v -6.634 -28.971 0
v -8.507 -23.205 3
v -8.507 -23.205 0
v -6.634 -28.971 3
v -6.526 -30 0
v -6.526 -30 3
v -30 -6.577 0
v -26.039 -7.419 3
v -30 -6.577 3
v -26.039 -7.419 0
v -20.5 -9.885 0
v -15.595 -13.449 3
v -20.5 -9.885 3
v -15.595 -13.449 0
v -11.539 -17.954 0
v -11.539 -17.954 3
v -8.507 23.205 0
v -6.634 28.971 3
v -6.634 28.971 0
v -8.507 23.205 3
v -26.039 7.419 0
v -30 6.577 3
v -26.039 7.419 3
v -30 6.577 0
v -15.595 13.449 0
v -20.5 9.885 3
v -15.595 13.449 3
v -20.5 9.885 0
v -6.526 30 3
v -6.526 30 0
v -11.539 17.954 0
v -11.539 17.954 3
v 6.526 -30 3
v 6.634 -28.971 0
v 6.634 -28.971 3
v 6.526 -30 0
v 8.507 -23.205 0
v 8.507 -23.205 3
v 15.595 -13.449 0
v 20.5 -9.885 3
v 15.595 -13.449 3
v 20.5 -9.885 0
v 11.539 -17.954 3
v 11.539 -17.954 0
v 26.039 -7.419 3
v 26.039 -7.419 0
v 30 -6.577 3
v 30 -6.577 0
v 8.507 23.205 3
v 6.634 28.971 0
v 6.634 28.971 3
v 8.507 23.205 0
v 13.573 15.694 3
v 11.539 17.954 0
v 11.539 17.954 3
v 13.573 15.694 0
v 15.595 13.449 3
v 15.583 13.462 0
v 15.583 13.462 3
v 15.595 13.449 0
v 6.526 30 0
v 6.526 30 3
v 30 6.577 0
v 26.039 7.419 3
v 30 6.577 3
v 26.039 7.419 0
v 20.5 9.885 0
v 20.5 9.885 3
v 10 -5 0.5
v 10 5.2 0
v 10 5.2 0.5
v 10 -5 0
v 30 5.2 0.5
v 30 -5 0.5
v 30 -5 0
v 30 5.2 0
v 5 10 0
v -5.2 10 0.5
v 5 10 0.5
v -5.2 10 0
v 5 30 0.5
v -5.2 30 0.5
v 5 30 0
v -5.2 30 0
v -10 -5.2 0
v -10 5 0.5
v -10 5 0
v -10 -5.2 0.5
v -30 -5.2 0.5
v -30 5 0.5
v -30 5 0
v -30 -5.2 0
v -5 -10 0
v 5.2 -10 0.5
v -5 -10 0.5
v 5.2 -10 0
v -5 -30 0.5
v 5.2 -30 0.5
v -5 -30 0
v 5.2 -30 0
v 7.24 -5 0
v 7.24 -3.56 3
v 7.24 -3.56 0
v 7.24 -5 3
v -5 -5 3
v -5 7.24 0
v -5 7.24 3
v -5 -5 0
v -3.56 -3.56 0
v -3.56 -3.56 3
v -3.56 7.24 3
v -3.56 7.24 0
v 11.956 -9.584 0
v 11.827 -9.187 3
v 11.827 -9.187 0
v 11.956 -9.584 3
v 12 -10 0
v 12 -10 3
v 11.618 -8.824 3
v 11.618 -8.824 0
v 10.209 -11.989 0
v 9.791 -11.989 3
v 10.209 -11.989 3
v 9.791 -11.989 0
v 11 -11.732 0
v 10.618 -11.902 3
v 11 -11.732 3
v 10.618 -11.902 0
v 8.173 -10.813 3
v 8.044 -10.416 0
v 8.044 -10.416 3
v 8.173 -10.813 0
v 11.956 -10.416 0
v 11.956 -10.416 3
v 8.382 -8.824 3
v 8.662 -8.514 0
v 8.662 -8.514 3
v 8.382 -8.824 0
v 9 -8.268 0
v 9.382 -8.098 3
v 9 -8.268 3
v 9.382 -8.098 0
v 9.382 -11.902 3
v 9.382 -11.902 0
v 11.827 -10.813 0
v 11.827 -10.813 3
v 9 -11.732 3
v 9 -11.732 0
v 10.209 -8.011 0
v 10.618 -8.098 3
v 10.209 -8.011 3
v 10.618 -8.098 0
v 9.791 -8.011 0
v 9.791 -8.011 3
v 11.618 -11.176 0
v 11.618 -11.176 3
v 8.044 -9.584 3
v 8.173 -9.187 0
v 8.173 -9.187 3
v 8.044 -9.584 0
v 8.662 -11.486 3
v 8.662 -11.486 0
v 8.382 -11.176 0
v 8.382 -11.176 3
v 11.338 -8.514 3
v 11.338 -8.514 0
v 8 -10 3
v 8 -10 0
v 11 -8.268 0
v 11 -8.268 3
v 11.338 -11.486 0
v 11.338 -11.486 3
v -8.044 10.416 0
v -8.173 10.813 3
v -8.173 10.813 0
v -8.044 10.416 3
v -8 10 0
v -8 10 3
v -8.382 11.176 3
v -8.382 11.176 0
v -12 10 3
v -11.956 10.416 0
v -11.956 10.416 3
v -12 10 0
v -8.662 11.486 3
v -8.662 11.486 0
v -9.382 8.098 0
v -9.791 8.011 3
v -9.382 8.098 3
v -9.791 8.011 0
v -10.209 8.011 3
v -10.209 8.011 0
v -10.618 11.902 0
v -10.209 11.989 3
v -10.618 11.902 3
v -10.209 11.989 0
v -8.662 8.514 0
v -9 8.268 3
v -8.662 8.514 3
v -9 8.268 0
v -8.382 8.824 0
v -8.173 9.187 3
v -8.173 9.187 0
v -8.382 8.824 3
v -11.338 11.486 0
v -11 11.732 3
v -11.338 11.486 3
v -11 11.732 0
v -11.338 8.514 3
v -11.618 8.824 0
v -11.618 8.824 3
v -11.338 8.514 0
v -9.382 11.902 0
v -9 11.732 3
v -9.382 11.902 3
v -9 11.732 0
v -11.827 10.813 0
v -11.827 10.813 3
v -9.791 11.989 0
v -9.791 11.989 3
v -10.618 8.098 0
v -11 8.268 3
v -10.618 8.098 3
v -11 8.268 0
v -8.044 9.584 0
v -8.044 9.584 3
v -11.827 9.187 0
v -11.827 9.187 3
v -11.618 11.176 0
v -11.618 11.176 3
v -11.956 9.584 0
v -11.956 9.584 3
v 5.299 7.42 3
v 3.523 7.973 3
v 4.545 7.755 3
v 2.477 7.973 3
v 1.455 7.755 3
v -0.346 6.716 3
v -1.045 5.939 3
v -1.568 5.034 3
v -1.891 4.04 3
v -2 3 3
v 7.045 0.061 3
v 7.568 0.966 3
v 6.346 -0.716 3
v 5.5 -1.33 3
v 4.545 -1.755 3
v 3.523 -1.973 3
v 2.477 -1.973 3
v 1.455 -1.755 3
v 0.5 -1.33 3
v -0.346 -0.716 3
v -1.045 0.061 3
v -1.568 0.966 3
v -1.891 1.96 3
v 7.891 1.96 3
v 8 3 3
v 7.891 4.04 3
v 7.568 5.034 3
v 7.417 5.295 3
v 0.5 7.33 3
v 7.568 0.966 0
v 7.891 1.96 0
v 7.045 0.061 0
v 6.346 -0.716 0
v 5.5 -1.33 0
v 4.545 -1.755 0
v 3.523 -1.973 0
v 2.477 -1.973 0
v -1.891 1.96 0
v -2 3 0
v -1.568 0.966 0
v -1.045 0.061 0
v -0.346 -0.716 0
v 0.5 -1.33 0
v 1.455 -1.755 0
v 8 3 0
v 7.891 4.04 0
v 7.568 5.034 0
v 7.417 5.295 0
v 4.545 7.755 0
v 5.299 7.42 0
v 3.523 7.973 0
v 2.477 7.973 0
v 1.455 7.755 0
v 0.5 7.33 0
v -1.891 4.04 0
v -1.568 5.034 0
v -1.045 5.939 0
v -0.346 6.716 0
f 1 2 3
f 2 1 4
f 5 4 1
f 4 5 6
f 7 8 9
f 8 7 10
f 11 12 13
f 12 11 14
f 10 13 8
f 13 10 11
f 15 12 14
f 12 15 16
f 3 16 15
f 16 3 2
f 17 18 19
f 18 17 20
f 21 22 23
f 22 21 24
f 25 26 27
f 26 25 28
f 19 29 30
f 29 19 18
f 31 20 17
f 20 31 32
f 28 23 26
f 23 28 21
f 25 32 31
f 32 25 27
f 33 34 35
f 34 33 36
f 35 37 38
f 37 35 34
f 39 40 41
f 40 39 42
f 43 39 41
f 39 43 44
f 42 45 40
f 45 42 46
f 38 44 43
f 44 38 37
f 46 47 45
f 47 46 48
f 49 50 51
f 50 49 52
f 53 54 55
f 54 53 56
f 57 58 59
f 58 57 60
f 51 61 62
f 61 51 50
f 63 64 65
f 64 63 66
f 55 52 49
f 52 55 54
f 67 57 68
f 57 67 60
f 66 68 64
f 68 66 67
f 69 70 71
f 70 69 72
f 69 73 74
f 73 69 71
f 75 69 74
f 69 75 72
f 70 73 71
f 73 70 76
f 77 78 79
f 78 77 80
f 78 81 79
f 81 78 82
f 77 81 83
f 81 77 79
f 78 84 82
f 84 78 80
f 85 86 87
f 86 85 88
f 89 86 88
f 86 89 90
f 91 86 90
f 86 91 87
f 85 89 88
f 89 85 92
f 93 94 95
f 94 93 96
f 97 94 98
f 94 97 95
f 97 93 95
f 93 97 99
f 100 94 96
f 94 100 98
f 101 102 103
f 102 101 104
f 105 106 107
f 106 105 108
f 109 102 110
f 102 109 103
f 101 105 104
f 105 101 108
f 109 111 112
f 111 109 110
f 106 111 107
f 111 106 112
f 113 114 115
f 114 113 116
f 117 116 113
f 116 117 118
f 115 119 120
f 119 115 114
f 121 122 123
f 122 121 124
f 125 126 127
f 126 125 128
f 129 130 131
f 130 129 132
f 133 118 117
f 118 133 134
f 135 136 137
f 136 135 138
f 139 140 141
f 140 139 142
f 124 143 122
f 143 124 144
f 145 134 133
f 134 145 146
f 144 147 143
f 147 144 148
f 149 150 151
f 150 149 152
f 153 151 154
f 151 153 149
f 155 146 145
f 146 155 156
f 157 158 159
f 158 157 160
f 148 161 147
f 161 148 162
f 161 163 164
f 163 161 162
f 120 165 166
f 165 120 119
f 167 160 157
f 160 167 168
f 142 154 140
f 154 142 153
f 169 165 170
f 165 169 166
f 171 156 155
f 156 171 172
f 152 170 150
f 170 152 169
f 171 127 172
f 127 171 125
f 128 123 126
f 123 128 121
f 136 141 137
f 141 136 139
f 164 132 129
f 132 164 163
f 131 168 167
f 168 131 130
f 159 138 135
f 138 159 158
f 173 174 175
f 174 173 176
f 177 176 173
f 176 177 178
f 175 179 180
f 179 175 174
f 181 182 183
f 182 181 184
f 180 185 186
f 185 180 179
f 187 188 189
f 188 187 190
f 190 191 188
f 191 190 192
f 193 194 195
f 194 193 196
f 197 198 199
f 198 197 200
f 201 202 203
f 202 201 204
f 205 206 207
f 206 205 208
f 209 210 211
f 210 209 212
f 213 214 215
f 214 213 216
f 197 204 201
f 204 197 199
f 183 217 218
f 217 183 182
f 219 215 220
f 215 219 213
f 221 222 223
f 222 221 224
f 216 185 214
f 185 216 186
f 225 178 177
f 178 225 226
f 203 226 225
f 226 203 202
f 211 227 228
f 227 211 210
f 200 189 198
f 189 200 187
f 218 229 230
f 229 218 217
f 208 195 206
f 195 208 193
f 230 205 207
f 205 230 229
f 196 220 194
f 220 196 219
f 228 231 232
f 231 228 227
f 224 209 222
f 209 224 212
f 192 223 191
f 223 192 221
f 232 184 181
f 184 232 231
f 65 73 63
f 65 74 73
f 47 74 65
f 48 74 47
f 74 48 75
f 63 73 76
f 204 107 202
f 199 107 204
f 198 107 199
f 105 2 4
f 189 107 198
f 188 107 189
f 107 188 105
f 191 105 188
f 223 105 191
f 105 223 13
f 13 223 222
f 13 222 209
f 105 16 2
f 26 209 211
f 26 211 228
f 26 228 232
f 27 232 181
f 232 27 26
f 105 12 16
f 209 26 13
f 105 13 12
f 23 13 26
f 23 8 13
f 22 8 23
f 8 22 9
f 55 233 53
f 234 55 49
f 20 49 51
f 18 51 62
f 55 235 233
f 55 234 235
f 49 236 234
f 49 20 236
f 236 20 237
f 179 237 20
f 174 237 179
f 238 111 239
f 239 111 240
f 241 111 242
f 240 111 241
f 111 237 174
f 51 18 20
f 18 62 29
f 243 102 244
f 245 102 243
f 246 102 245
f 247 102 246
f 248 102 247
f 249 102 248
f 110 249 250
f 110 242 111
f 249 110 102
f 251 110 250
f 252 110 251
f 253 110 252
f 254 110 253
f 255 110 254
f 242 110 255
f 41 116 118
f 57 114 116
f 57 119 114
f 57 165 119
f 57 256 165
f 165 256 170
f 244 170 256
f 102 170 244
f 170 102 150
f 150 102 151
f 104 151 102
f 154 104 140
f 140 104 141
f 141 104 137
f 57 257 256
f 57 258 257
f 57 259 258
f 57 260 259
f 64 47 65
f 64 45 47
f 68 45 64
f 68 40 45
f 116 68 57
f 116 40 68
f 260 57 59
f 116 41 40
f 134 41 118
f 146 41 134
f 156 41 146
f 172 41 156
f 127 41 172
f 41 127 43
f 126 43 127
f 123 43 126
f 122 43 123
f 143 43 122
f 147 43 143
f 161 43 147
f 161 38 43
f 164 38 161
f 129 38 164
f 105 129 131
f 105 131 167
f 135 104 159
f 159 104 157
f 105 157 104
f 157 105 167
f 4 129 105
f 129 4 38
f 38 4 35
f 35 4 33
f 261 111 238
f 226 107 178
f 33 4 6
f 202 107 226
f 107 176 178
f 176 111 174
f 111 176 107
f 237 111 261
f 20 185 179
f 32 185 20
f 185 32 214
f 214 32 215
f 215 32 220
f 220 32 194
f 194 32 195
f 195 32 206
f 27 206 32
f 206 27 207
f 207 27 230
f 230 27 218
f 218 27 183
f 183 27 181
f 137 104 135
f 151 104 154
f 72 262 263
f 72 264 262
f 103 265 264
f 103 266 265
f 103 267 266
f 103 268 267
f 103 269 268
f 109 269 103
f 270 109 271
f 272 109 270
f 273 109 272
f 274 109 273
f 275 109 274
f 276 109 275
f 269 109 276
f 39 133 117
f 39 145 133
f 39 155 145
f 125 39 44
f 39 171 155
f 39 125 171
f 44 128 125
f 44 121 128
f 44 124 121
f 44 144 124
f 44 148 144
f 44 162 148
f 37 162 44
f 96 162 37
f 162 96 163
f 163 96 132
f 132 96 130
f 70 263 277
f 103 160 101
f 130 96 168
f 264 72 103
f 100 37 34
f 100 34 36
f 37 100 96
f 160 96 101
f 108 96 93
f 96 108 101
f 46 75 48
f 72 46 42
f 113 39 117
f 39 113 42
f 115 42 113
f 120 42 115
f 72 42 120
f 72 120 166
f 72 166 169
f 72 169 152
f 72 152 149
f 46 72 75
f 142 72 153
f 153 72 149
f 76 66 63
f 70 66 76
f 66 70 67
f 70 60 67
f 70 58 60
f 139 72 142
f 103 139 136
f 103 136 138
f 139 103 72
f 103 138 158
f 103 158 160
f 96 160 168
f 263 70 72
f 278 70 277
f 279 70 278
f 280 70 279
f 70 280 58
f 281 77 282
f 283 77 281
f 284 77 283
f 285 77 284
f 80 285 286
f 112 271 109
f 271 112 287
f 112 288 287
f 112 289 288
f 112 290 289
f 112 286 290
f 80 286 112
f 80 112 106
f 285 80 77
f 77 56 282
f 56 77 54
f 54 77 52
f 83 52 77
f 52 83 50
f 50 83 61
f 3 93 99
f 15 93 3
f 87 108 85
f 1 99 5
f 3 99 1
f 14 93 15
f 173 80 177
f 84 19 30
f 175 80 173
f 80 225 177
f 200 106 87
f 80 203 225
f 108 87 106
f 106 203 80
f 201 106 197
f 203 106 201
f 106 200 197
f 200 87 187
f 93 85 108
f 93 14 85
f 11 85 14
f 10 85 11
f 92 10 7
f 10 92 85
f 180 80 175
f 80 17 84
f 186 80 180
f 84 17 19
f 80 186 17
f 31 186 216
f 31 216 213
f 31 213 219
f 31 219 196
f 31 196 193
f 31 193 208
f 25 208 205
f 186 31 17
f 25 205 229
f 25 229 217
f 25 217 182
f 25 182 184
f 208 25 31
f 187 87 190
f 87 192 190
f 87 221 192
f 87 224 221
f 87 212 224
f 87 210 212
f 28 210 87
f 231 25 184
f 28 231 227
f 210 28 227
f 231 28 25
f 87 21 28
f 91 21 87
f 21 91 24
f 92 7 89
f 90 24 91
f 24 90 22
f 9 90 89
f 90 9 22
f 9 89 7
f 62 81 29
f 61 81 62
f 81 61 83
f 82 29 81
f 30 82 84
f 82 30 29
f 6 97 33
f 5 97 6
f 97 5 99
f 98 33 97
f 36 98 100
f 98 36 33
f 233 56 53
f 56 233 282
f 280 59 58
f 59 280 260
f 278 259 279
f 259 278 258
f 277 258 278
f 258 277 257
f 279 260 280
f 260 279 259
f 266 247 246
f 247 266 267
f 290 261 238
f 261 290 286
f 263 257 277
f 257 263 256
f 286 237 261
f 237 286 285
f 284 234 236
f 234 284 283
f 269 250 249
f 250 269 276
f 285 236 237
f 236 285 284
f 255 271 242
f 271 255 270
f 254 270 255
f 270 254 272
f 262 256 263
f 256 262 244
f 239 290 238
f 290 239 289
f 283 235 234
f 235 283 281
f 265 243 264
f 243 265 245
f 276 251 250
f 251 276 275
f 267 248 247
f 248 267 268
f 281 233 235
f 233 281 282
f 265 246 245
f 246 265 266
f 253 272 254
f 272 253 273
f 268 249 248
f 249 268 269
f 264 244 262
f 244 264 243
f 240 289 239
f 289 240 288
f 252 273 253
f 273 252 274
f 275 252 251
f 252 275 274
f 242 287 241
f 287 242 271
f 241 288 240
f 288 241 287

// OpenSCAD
// file: t.scad
module t(x=0,y=0,z=0){
    translate([x,y,z])children();
}
module tx(a){
    translate([a,0,0])children();
}

module ty(a){
    translate([0,a,0])children();
}

module tz(a){
    translate([0,0,a])children();
}

module r(x=0,y=0,z=0){
    rotate([x,y,z])children();
}
module rx(a){
    rotate([a,0,0])children();
}

module ry(a){
    rotate([0,a,0])children();
}

module rz(a){
    rotate([0,0,a])children();
}

module mx(){
    mirror([1,0,0])children();
}

module my(){
    mirror([0,1,0])children();
}

module mz(){
    mirror([0,0,1])children();
}

module cub(x=1,y=1,z=1,c=true,h=true){
    tz(h?(z/2):0)cube([x,y,z],c);
}

module ring(r1,t,h){
    difference(){
        cylinder(r=r1,h=h);
        tz(-.1)cylinder(r=r1-t,h=h+1);
    }
}
// main file
include <t.scad>

$fn=30;

module angle(l){
    cube([10.2,1.2,l]);
    cube([1.2,10.2,l]);
}

module clamp(){
    difference(){
        hull(){
            for(i=[-1,1])tx(i*4)cylinder(r=10,h=30);
            t(-13,-9)cylinder(r=1,h=30);
        }
        #t(-2,-3,5)angle(40);
        #t(-2-1.2,-3-1.2,-0.1)angle(25.1);
        #t(-8,9,15)rotate([90,0,0])bolt();
        t(-8,-3.5,15)rotate([90,0,0])cylinder(r=5.5/2,h=7);
        
        t(-22,-4,-.1)cube([30,1,41]);
    }
}
module bolt(){
    color("grey"){
        cylinder(r=7.5/2,h=3);
        cylinder(r=4/2,h=23);
    }
    color("red")tz(-2)cylinder(r=7/2,h=3);
        
}

module hubbase(){
    difference(){
        tz(5.5)cube([60,60,11],true);
        for(x=[-1,1])for(y=[-1,1])
            t(x*35,y*35,-.1)cylinder(r=29,h=13);
        for(a=[0,90,180,270])
            rotate(a)t(10,-5,11.5)rotate([0,90,0])angle(60);
        t(-5,-5,3)angle(60);
        rotate(45)t(4,-1.5,-.1)cube([50,3,13]);
        t(3,3)tz(-.1)cylinder(r=5,h=13);
        for(i=[1,-1])t(i*10,-i*10,-.1)
            cylinder(r=5/2,h=12.2);
    }
    
}
module hubtop(){
    difference(){
        tz(1.5)cube([60,60,3],true);
        for(x=[-1,1])for(y=[-1,1])
            t(x*35,y*35,-.1)cylinder(r=29,h=13);
        for(a=[0,90,180,270])
            rotate(a)t(10,-5,.5)rotate([0,90,0])angle(60);
        t(-5,-5,-3)scale(1.2)angle(60);
        rotate(45)t(4,-1.5,-.1)cube([50,3,13]);
        t(3,3)tz(-.1)cylinder(r=5,h=13);
        for(i=[1,-1])t(i*10,-i*10,-.1)
            cylinder(r=4/2,h=12.2);
        *for(i=[1,-1])t(i*10,-i*10,5)
            %mirror([0,0,1])bolt();
    }
    
}

module gripbase(){
    difference(){
        union(){
            tz(4)cube([60,60,8],true);
            tz(-10)cube([20,20,21],true);
        }
        for(x=[-1,1])for(y=[-1,1])
            t(x*35,y*35,-.1)cylinder(r=29,h=13);
        t(-5,-5,3)angle(60);
        for(x=[-1,1])for(y=[-1,1])
            t(39.5*x,39.5*y,1.25)#ring(38,1.5,6);

    }
    
}

module gripmid(){
    difference(){
        tz(4)cube([60,60,8],true);
        for(x=[-1,1])for(y=[-1,1])
            t(x*35,y*35,-.1)cylinder(r=29,h=13);
        for(x=[-1,1])for(y=[-1,1])
            t(39.5*x,39.5*y,1.25)#ring(38,1.5,6);

        t(-5,-5,-3)scale(1.02)angle(60);
    }
    
}
%t(-5,-5,3)angle(360);
        
*tz(100)r(180)gripmid();

//for(i=[0:1])for(j=[0:3])t(i*30,j*25)clamp()
//r(180)tz(20)gripbase();
//rz(-36)for(i=[0:2])for(j=[0:1])
//t(i*40-j*32,j*40+i*32,0)
//hubbase();
//tz(11.5)
//*tz(3)rotate([180,0,0])
hubtop();

%for(x=[-1,1])for(y=[-1,1])t(x*38.5,y*38.5)cylinder(r=67.5/2,h=258);
